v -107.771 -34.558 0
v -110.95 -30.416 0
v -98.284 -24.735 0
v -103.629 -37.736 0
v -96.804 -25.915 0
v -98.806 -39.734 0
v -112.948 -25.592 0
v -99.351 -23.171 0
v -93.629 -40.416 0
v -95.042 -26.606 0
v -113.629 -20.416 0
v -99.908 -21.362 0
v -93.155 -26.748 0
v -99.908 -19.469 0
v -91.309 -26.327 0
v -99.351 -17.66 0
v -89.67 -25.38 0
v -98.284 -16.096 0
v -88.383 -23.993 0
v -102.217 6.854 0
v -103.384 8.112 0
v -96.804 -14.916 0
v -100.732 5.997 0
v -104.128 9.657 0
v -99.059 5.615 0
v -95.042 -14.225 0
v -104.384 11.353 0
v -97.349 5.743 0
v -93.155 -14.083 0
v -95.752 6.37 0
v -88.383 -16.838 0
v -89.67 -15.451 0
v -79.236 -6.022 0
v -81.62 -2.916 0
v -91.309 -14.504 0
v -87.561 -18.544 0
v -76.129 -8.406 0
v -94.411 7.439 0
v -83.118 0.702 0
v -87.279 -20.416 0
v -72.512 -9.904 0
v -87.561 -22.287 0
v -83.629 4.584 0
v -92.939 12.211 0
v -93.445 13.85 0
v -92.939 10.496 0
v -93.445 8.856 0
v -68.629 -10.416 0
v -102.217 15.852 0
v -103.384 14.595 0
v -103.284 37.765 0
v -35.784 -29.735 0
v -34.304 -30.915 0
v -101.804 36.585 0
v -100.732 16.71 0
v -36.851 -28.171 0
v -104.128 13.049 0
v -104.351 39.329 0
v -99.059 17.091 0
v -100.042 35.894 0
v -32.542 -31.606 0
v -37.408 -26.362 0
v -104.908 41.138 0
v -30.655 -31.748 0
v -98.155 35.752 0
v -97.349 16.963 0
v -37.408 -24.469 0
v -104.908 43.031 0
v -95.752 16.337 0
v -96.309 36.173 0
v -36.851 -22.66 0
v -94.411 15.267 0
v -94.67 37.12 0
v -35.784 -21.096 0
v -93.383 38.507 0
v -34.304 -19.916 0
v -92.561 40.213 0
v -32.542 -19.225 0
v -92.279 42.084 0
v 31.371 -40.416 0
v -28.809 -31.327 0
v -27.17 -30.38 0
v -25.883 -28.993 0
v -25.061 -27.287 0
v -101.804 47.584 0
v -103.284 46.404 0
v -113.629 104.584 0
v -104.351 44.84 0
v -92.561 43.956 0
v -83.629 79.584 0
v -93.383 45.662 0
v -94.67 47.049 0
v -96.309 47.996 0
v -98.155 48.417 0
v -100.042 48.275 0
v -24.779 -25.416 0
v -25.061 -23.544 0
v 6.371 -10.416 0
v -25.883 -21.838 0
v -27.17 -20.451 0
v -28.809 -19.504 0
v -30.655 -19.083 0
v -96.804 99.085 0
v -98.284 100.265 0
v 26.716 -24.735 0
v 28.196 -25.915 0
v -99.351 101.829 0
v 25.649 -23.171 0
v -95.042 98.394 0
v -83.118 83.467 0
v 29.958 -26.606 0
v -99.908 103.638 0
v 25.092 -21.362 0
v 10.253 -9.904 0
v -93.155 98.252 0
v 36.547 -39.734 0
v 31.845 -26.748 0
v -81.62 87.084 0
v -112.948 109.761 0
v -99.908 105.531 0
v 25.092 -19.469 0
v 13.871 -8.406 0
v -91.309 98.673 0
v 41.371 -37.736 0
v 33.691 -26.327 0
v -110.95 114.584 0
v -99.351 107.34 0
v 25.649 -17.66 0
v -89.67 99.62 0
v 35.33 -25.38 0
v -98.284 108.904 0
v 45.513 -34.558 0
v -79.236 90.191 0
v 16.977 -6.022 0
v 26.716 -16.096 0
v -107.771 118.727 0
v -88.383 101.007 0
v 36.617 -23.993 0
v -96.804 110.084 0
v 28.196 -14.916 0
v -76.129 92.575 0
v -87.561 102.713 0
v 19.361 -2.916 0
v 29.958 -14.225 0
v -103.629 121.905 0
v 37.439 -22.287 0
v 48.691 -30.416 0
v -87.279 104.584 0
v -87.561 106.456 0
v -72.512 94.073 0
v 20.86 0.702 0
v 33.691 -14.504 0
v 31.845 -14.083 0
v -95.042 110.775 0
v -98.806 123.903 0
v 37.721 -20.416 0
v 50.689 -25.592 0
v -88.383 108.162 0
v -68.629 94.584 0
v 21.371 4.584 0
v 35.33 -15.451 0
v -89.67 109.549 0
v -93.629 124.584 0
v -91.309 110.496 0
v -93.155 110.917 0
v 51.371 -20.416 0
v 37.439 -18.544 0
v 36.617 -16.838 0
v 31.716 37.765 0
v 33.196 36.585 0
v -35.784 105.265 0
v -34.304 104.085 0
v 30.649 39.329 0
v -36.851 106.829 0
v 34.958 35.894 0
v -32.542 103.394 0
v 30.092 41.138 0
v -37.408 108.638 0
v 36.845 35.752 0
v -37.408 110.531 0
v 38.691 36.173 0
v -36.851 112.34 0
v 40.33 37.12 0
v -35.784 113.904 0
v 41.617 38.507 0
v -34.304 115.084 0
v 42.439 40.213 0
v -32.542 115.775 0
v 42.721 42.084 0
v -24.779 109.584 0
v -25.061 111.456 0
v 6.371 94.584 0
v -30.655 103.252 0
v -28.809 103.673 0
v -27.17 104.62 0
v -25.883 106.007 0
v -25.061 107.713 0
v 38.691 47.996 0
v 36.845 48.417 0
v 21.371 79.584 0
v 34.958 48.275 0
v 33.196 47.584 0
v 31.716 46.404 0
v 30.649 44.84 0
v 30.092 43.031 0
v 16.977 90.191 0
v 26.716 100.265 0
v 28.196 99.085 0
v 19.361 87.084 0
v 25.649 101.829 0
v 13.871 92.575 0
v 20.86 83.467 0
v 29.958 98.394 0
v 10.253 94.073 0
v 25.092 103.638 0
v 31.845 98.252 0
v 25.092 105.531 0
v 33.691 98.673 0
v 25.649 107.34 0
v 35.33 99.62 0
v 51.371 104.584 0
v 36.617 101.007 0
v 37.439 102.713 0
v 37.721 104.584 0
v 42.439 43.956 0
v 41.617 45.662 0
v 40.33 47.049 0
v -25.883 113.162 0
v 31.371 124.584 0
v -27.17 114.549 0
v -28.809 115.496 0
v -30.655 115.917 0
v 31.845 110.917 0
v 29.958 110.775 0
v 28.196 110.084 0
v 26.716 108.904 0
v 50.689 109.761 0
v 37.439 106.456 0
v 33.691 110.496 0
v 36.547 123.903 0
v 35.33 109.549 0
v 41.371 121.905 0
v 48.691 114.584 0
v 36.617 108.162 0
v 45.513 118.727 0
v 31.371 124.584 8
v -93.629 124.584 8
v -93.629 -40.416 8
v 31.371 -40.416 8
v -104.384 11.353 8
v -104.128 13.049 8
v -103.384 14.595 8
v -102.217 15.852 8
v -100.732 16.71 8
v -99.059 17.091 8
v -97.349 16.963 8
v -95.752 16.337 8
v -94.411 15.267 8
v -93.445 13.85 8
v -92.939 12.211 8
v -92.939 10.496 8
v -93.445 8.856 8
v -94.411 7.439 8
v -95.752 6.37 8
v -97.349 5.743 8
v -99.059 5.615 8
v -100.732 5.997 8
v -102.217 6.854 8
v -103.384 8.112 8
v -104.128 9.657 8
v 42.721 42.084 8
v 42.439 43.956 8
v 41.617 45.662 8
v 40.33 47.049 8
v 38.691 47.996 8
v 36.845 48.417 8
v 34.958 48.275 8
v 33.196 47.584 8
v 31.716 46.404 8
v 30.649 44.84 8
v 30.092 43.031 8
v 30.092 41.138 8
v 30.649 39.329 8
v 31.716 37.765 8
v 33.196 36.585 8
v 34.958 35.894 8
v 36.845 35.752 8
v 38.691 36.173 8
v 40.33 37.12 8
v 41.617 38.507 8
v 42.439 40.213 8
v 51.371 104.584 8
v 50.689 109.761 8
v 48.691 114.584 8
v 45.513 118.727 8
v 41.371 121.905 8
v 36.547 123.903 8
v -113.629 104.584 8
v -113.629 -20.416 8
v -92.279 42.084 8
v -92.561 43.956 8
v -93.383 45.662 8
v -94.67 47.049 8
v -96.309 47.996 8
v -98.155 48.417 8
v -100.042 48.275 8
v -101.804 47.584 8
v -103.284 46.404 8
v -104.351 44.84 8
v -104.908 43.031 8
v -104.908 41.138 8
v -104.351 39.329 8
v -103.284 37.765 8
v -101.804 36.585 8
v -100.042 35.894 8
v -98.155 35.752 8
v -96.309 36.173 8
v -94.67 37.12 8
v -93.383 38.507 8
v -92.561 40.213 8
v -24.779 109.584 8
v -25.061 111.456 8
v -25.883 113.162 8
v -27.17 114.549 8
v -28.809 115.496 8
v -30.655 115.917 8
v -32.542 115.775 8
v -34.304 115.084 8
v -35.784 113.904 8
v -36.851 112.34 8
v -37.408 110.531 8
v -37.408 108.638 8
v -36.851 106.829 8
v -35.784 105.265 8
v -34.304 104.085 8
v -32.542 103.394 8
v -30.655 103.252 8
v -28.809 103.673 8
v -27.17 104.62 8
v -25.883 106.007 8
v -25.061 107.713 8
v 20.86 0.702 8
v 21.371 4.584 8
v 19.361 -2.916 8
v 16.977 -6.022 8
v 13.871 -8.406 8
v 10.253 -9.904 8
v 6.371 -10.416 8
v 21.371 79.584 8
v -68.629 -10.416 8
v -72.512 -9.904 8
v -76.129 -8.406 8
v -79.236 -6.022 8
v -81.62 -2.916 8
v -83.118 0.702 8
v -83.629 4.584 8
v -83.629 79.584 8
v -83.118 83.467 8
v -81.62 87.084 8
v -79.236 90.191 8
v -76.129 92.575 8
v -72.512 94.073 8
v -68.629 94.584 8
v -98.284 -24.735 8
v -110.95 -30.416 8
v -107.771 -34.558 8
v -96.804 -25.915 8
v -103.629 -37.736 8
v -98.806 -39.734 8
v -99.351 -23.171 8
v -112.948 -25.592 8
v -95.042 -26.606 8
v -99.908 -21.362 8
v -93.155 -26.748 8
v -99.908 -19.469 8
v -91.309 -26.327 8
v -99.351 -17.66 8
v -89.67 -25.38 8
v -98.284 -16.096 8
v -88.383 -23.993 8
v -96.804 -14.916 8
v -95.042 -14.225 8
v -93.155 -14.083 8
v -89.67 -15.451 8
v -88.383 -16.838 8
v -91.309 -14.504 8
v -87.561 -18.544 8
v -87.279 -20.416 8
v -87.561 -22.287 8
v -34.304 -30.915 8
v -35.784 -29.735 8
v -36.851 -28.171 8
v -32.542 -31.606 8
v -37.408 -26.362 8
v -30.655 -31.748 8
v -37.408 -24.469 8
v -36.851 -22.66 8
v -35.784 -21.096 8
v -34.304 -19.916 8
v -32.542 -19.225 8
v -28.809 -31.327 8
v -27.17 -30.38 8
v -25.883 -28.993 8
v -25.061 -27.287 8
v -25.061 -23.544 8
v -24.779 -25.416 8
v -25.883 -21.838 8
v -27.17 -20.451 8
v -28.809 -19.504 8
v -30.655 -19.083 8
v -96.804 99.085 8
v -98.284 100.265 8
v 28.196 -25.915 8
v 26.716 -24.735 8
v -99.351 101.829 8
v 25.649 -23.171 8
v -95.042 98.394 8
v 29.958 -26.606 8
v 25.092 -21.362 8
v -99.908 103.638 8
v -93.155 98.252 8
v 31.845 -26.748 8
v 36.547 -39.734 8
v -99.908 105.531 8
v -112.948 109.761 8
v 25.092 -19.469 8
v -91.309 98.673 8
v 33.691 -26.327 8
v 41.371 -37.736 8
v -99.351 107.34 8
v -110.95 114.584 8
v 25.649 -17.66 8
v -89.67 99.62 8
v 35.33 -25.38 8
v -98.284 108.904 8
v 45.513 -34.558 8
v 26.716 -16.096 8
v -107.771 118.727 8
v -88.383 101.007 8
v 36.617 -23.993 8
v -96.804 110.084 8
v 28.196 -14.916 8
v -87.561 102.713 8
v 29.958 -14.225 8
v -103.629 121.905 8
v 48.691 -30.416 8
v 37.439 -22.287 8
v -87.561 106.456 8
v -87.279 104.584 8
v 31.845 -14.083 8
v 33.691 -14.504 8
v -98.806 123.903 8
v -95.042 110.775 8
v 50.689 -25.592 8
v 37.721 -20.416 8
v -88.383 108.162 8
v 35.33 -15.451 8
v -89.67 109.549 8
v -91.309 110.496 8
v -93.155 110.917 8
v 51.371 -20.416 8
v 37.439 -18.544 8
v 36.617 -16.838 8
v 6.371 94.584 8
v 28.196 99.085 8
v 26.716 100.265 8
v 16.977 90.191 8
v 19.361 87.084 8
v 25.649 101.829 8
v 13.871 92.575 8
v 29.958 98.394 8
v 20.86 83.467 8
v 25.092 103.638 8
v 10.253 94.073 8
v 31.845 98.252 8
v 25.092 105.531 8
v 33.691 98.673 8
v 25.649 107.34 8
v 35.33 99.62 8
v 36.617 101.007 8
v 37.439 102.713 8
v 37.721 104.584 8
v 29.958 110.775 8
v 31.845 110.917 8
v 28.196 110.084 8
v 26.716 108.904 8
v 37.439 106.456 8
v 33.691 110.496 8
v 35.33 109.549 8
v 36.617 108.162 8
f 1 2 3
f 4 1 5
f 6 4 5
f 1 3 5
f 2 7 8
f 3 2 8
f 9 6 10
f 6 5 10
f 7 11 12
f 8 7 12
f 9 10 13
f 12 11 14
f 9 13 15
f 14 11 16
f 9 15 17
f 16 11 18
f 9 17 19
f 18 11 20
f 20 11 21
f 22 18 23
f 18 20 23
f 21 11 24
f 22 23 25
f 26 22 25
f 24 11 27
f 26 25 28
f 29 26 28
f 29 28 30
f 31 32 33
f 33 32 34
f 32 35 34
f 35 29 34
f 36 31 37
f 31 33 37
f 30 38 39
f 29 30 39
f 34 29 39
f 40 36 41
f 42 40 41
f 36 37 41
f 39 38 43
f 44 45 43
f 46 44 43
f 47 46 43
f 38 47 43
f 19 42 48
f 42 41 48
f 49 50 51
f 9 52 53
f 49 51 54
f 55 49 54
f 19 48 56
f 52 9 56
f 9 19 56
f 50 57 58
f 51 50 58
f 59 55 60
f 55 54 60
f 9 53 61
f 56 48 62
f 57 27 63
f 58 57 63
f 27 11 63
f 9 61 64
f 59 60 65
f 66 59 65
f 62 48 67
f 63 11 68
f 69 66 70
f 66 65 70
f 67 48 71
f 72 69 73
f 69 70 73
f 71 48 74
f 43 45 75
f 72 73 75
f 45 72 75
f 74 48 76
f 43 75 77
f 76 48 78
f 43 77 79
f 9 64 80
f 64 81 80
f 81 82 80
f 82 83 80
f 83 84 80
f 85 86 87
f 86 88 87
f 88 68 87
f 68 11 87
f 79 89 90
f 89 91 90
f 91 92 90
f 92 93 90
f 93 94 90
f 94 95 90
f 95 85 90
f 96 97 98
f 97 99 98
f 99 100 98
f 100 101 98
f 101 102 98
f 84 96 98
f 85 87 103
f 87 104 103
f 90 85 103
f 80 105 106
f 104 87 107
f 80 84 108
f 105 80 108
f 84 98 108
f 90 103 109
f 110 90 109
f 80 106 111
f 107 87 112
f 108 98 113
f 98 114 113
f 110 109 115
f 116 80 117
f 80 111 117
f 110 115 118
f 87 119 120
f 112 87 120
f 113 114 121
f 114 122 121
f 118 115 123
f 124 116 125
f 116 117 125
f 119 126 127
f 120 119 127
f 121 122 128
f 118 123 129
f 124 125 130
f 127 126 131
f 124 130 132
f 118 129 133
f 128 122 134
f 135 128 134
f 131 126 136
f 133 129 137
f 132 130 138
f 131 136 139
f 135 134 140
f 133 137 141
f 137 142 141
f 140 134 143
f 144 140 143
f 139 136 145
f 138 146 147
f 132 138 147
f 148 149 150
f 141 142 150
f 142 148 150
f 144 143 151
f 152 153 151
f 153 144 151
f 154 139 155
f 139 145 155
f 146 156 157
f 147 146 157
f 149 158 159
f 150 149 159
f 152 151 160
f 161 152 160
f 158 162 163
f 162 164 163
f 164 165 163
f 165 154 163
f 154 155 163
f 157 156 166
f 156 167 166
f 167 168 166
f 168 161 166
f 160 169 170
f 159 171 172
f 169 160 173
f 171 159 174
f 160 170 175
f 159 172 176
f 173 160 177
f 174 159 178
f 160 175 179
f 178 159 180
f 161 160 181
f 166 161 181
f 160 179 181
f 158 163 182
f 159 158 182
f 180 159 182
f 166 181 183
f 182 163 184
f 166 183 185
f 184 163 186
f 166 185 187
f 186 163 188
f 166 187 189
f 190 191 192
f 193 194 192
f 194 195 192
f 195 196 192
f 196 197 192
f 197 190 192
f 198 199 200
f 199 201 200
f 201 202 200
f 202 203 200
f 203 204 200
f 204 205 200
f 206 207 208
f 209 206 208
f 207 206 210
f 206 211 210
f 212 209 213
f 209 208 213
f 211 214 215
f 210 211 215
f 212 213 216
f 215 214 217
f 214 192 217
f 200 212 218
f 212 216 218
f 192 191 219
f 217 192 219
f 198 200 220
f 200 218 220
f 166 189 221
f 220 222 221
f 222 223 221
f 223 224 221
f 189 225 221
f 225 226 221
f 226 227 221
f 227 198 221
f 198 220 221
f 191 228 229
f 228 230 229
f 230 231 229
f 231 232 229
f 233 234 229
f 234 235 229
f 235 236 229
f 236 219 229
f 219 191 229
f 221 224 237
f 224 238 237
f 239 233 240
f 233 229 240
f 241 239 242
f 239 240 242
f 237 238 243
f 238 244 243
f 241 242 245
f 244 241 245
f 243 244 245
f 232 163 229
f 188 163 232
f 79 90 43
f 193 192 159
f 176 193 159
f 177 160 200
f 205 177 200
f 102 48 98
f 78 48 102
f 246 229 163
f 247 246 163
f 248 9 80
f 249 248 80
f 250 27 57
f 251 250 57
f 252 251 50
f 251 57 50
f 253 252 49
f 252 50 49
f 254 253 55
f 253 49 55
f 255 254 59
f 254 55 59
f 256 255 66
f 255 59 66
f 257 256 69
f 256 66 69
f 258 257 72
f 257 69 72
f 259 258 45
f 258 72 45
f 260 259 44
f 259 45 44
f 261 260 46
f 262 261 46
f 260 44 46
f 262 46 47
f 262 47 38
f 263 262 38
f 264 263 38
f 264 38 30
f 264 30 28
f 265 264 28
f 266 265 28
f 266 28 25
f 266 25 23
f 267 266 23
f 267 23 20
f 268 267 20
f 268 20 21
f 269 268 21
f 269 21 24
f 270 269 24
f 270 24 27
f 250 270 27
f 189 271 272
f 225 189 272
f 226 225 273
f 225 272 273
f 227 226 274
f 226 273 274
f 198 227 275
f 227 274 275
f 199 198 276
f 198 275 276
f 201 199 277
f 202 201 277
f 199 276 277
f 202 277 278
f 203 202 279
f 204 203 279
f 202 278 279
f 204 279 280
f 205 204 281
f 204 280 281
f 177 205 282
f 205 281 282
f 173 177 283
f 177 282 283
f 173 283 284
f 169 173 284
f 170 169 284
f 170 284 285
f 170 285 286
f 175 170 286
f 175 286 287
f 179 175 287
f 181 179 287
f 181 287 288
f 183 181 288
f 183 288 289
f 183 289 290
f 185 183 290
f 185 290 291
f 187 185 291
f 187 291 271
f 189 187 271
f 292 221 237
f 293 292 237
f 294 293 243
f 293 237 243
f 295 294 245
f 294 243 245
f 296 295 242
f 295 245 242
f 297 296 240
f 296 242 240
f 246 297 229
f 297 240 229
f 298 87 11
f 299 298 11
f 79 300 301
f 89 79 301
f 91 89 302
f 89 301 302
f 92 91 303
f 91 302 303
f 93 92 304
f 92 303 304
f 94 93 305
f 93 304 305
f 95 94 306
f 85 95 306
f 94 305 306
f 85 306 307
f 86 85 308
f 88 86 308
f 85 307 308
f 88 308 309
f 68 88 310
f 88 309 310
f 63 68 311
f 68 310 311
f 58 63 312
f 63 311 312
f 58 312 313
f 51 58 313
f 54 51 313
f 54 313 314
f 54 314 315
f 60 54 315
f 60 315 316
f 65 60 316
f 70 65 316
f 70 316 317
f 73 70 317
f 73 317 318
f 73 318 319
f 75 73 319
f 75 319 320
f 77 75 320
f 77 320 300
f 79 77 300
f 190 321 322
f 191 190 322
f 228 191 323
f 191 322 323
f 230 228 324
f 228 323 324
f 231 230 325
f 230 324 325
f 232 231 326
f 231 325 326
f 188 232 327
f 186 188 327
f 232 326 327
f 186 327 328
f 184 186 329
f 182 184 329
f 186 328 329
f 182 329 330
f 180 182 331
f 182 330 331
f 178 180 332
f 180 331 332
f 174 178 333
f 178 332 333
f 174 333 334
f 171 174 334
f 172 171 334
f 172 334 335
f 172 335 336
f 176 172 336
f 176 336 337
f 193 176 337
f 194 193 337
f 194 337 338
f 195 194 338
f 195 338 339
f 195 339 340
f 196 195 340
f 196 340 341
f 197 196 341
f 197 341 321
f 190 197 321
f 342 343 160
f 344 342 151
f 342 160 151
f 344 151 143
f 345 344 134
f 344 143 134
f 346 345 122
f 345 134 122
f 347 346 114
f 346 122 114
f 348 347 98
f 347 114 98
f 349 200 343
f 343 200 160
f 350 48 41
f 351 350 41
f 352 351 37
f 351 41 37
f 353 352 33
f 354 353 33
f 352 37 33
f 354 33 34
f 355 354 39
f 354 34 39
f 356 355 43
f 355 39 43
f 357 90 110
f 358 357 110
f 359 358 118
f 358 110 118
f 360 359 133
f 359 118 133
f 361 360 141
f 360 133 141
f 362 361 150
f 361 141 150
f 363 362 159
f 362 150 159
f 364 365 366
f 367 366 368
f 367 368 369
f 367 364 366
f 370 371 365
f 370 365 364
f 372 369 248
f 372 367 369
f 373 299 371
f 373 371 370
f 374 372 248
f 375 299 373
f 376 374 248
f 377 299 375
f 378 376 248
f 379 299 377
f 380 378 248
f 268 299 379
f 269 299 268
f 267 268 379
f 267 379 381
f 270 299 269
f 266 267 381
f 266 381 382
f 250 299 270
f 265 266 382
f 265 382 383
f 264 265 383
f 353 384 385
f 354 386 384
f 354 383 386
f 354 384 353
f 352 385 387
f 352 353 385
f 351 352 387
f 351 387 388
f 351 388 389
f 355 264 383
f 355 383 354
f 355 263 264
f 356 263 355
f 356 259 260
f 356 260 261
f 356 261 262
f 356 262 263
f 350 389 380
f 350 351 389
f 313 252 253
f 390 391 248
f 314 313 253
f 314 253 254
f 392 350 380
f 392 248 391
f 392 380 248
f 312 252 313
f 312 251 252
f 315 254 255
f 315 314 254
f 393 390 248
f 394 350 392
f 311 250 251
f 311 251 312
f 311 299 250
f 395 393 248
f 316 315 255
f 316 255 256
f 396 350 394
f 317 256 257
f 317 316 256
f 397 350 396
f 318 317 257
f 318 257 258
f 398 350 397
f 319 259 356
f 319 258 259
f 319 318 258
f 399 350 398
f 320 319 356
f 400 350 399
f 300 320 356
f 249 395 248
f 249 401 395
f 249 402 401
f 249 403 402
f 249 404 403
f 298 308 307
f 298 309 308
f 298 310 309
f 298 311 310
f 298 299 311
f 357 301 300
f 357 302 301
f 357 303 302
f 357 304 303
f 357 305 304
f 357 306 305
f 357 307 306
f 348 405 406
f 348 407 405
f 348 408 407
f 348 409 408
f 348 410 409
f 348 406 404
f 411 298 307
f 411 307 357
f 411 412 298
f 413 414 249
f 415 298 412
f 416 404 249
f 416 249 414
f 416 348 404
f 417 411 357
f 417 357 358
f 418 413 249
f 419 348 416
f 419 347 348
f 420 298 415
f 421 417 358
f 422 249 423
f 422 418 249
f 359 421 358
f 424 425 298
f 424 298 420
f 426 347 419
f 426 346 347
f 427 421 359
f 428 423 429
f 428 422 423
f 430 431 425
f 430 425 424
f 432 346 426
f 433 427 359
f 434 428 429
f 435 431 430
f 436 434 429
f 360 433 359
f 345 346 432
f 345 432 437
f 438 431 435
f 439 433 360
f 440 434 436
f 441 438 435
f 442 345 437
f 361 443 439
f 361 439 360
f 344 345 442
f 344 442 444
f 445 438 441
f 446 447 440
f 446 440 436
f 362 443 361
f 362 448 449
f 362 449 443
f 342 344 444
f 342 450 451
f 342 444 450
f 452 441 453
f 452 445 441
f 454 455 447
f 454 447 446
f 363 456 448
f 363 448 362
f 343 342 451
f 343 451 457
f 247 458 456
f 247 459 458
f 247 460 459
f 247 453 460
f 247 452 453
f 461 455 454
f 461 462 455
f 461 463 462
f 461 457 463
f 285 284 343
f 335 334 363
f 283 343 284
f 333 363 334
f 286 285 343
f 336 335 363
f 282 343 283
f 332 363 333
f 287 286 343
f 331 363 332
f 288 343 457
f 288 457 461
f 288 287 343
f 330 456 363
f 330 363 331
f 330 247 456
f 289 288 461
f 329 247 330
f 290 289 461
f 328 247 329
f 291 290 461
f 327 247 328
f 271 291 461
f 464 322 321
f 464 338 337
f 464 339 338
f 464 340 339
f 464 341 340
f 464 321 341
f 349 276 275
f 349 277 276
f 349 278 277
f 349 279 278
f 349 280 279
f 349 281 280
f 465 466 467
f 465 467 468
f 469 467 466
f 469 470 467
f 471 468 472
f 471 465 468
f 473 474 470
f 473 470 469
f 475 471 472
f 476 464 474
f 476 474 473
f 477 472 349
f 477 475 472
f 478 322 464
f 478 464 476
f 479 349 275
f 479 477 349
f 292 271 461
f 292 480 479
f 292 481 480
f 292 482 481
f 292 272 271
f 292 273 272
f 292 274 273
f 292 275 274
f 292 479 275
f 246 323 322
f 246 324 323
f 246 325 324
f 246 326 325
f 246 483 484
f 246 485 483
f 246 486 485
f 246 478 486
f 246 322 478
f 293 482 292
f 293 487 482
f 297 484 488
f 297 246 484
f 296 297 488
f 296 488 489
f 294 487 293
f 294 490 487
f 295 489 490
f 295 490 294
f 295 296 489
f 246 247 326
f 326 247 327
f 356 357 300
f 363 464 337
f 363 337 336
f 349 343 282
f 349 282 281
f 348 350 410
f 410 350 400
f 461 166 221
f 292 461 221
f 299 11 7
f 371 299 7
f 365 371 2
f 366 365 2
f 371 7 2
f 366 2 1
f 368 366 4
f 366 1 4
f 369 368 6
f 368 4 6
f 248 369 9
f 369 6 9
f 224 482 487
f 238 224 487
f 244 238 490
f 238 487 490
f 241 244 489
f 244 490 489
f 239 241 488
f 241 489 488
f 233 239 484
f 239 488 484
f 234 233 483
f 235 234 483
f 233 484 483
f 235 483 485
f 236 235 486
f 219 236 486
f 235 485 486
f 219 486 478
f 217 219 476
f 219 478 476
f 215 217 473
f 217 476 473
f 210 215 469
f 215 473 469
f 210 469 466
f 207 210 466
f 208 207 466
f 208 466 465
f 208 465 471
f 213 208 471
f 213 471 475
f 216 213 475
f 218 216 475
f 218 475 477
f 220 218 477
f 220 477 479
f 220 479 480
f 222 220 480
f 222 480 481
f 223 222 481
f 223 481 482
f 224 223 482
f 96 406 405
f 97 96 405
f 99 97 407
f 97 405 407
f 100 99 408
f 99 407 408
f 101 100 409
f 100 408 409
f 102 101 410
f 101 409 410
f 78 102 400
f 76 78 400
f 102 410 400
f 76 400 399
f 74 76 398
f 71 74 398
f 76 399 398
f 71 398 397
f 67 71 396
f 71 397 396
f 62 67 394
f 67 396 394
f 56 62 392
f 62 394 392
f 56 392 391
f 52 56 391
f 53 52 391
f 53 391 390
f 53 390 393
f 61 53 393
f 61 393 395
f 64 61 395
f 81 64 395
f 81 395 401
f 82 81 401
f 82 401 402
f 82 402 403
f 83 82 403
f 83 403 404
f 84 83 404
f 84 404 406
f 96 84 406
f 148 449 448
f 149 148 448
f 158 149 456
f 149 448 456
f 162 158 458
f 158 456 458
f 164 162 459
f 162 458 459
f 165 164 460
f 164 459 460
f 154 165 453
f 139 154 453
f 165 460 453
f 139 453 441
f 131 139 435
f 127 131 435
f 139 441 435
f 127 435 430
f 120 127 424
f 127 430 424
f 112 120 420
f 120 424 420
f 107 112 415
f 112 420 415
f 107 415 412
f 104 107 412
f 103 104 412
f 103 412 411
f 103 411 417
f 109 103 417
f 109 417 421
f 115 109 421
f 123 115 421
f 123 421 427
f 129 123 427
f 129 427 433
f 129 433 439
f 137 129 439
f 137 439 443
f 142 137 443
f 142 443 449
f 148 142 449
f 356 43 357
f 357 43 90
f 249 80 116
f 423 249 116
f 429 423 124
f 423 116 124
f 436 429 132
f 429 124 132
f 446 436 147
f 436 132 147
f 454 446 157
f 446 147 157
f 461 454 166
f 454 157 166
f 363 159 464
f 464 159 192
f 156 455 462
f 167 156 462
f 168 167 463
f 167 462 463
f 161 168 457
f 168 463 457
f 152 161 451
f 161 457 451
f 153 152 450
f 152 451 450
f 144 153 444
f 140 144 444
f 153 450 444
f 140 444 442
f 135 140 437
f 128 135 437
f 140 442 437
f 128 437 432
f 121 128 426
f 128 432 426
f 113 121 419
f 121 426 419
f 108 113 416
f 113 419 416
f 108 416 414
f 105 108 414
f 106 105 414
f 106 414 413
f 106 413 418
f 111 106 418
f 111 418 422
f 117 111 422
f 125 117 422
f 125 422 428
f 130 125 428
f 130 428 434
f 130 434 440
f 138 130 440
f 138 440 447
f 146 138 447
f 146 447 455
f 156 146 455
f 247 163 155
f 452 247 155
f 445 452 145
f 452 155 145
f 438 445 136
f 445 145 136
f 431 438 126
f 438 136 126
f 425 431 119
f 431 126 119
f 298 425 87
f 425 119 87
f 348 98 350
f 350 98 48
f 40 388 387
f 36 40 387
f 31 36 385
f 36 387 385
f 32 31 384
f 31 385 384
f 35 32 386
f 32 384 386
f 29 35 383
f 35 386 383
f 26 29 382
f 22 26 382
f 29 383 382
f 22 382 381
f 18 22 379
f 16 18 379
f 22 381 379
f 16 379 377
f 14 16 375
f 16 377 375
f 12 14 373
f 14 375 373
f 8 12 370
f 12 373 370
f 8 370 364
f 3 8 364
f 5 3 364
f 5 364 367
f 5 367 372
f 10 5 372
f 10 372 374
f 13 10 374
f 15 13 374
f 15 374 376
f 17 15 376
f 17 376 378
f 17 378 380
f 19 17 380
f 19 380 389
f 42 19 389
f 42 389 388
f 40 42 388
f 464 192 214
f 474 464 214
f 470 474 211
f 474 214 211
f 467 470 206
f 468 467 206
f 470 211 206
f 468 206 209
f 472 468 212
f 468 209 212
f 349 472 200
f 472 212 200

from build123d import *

# Parameters (mm, degrees)
F1_DEPTH = 8
F2_R     = 6.35
F3_DEPTH = 8.001
F4_D     = 11.50874


with BuildPart() as f1:
    # F0 (on Top) → F1 (new body)
    with BuildSketch(Plane.XY):
        with BuildLine():
            Line((31.3706356287, 124.5844857395), (-93.6293643713, 124.5844857395))
            ThreePointArc((-93.6293643713, 124.5844857395), (-107.771499995, 118.7266213632), (-113.6293643713, 104.5844857395))
            Line((-113.6293643713, 104.5844857395), (-113.6293643713, -20.4155142605))
            ThreePointArc((-113.6293643713, -20.4155142605), (-107.771499995, -34.5576498843), (-93.6293643713, -40.4155142605))
            Line((-93.6293643713, -40.4155142605), (31.3706356287, -40.4155142605))
            ThreePointArc((31.3706356287, -40.4155142605), (45.5127712524, -34.5576498843), (51.3706356287, -20.4155142605))
            Line((51.3706356287, -20.4155142605), (51.3706356287, 104.5844857395))
            ThreePointArc((51.3706356287, 104.5844857395), (45.5127712524, 118.7266213632), (31.3706356287, 124.5844857395))
        make_face()
        with BuildLine():
            ThreePointArc((-83.6293643713, 79.5844857395), (-79.2359660891, 90.1910874573), (-68.6293643713, 94.5844857395))
            Line((-68.6293643713, 94.5844857395), (6.3706356287, 94.5844857395))
            ThreePointArc((6.3706356287, 94.5844857395), (16.9772373465, 90.1910874573), (21.3706356287, 79.5844857395))
            Line((21.3706356287, 79.5844857395), (21.3706356287, 4.5844857395))
            ThreePointArc((21.3706356287, 4.5844857395), (16.9772373465, -6.0221159783), (6.3706356287, -10.4155142605))
            Line((6.3706356287, -10.4155142605), (-68.6293643713, -10.4155142605))
            ThreePointArc((-68.6293643713, -10.4155142605), (-79.2359660891, -6.0221159783), (-83.6293643713, 4.5844857395))
            Line((-83.6293643713, 4.5844857395), (-83.6293643713, 79.5844857395))
        make_face(mode=Mode.SUBTRACT)
    extrude(amount=F1_DEPTH)

    # F2 (on face) → F3 (cut, through all)
    with BuildSketch(Plane.XY.offset(8)):
        with Locations((-93.6293643713, 104.5844857395)):
            Circle(F2_R)
        with Locations((-31.1293643713, 109.5844857395)):
            Circle(F2_R)
        with Locations((31.3706356287, 104.5844857395)):
            Circle(F2_R)
        with Locations((36.3706356287, 42.0844857395)):
            Circle(F2_R)
        with Locations((31.3706356287, -20.4155142605)):
            Circle(F2_R)
        with Locations((-31.1293643713, -25.4155142605)):
            Circle(F2_R)
        with Locations((-93.6293643713, -20.4155142605)):
            Circle(F2_R)
        with Locations((-98.6293643713, 42.0844857395)):
            Circle(F2_R)
    extrude(amount=-F3_DEPTH, mode=Mode.SUBTRACT)

    # F4 (through all)
    with Locations(Plane.XY.offset(8)):
        with Locations((-98.6293643713, 11.3532003015)):
            Hole(F4_D / 2)


solid = f1.part
